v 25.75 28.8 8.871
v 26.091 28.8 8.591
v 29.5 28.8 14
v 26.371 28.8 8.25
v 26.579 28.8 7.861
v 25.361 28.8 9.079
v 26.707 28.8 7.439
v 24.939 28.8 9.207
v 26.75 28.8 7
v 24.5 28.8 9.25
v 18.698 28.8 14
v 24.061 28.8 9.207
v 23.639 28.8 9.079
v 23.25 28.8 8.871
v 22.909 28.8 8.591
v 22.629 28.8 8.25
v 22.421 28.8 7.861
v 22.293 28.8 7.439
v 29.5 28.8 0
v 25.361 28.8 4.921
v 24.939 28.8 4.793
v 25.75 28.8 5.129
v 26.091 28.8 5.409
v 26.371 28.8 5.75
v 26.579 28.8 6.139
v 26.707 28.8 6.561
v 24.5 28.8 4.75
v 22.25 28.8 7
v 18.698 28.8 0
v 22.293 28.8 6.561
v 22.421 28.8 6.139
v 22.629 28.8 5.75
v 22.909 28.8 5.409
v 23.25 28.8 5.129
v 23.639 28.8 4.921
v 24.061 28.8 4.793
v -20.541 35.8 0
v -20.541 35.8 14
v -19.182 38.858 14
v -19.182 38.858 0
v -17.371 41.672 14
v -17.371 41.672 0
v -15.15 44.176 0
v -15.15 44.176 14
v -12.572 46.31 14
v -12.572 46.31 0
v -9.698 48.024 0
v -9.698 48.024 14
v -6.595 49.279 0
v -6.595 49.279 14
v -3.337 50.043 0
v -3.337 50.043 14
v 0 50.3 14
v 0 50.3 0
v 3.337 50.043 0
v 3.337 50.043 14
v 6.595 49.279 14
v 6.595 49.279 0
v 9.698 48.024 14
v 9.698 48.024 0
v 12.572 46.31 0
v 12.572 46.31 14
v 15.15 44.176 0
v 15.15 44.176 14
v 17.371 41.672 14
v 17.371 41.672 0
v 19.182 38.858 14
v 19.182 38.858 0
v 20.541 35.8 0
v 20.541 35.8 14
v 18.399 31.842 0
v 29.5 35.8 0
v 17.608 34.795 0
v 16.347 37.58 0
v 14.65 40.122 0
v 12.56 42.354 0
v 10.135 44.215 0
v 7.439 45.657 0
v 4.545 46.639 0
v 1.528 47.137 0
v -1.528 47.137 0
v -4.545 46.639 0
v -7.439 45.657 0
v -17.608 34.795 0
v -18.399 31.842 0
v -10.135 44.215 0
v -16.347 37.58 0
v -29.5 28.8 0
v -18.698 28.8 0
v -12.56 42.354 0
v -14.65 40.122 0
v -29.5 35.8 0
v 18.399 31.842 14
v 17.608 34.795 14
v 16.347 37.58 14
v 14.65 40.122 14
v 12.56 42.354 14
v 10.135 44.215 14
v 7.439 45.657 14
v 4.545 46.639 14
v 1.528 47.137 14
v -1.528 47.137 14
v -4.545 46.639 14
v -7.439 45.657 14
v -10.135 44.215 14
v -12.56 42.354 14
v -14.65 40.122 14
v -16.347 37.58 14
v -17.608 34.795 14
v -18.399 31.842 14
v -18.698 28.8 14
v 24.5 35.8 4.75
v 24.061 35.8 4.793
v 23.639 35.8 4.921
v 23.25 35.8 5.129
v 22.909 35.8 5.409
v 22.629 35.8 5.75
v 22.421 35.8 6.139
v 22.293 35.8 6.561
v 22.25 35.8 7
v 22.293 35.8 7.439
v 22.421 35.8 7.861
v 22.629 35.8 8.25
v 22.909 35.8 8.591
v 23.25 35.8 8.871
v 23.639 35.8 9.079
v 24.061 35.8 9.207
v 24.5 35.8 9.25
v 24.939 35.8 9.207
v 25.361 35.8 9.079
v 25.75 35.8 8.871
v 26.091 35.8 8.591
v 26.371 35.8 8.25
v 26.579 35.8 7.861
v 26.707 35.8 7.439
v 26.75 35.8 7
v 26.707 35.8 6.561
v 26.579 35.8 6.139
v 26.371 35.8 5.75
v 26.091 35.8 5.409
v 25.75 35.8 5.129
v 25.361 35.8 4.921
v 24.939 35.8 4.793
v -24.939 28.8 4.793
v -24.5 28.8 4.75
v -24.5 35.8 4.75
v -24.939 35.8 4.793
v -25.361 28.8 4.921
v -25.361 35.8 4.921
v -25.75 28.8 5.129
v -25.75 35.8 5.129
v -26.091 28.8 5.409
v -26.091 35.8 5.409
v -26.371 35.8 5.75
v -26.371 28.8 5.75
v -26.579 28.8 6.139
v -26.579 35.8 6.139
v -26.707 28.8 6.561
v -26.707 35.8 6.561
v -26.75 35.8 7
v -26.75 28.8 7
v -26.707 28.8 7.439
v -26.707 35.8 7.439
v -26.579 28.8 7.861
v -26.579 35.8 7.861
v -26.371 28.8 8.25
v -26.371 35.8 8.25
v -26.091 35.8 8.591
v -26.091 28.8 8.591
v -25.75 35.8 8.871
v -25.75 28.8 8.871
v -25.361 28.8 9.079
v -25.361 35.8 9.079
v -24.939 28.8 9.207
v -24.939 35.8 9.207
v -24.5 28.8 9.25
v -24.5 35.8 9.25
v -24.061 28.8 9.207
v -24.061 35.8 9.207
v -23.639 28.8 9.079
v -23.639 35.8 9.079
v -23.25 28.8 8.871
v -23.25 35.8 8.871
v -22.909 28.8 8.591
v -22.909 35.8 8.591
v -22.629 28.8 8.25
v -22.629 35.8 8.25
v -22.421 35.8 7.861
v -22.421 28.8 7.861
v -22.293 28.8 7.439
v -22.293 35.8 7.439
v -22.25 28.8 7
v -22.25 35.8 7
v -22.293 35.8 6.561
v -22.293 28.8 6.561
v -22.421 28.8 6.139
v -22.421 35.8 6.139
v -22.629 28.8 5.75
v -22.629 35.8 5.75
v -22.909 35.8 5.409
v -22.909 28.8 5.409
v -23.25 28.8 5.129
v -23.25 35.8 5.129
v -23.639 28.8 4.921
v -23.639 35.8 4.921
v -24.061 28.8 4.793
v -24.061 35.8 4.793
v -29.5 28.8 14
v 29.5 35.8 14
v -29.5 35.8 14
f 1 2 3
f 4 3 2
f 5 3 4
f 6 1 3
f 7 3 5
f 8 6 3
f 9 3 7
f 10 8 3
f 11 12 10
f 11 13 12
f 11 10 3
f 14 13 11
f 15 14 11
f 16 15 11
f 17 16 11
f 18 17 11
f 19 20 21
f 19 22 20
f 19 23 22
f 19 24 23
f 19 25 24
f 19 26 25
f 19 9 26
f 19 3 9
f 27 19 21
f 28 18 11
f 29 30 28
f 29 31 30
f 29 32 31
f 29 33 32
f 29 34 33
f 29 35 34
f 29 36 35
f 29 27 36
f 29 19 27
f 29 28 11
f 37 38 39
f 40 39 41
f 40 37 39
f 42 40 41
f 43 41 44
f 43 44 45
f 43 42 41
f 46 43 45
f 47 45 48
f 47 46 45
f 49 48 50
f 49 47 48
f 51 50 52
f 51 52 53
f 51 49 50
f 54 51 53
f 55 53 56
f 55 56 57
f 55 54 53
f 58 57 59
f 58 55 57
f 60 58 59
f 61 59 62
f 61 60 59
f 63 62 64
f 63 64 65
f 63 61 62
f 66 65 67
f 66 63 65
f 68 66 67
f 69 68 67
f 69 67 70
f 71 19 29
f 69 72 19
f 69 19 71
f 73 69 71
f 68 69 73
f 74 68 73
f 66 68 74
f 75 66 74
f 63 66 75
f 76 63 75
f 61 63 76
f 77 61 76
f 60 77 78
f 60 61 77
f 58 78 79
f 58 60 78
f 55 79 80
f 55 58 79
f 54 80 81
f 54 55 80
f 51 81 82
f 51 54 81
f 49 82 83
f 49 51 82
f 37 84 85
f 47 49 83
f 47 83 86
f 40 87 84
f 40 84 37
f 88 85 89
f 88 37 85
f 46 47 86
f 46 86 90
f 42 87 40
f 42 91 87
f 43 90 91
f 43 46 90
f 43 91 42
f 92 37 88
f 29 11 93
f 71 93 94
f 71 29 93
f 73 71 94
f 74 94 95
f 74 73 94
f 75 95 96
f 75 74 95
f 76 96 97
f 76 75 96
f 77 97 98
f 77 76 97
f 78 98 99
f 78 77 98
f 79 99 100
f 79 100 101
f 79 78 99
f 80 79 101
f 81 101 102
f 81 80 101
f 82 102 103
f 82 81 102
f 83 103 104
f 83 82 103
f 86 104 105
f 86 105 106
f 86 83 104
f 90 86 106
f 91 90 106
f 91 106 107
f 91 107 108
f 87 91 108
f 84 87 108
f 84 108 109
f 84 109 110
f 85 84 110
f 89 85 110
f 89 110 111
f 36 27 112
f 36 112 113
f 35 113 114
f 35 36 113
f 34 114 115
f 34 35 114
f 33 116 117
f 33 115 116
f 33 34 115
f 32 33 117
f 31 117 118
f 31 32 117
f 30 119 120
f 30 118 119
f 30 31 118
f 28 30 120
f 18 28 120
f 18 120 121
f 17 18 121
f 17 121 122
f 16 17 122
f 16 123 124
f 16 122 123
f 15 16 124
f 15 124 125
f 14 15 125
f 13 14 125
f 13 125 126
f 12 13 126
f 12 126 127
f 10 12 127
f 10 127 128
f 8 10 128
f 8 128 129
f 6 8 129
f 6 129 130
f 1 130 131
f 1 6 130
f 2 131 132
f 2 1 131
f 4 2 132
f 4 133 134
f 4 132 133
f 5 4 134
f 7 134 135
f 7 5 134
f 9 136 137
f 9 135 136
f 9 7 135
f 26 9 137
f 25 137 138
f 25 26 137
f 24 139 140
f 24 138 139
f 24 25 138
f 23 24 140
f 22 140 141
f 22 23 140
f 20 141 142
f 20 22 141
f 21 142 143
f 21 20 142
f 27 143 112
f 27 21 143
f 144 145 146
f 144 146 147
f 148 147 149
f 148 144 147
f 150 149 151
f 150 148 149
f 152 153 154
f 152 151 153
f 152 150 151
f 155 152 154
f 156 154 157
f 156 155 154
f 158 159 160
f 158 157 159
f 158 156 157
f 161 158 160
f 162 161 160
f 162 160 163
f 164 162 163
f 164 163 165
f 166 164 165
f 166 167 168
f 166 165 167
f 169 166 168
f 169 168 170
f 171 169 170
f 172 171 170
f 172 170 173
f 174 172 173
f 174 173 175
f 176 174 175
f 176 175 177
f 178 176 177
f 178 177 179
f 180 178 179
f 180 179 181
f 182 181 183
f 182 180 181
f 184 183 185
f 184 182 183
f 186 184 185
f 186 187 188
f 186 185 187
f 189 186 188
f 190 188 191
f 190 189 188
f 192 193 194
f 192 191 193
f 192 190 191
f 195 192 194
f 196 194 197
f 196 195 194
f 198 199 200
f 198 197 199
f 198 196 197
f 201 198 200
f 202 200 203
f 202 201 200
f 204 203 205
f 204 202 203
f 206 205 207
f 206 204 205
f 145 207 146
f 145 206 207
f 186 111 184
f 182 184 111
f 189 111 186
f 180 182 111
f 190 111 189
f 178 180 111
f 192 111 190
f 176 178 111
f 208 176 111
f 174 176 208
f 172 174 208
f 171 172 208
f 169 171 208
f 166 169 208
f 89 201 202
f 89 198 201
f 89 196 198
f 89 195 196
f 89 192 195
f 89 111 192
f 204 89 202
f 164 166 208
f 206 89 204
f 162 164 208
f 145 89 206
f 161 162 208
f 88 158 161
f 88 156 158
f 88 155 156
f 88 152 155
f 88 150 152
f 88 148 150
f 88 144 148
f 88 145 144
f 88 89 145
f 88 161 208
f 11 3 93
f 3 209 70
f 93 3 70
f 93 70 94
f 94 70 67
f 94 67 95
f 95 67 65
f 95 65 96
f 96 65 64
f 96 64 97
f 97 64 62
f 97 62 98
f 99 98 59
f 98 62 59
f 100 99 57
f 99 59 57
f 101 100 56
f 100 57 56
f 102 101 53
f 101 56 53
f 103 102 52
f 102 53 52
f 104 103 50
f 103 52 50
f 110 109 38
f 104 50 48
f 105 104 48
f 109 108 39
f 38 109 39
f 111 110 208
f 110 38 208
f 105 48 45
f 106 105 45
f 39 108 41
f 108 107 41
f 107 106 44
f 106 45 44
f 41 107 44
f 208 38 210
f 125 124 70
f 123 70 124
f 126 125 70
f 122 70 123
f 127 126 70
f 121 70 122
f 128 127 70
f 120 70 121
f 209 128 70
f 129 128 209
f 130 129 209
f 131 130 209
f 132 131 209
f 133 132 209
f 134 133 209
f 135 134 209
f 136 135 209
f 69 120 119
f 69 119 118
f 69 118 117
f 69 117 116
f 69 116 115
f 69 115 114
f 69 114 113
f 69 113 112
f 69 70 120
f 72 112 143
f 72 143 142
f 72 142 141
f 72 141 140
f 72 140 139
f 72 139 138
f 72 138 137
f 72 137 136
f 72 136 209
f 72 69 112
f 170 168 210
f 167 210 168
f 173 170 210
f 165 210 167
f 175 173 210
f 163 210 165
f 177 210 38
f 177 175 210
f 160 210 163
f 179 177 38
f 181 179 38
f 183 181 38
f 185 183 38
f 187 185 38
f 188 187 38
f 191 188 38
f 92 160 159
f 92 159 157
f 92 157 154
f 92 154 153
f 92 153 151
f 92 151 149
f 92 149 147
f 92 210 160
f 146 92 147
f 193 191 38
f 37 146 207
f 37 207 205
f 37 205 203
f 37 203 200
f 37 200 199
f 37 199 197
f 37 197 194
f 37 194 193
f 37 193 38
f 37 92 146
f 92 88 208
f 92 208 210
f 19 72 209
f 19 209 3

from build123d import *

# Parameters (mm, degrees)
BOLTED_CAP_AND_EARS_DEPTH   = 14
M4_THROUGH_HOLES_DEPTH      = 60.969492244
M4_THROUGH_HOLES_DEPTH_BACK = 60.969492244
SKETCH2_R                   = 2.25


with BuildPart() as part:
    # Bolted cap and ears profile → Bolted cap and ears (new body)
    with BuildSketch(Plane.XY):
        with BuildLine():
            Line((20.541421567, 35.8), (29.5, 35.8))
            Line((29.5, 35.8), (29.5, 28.8))
            Line((29.5, 28.8), (18.697593428, 28.8))
            ThreePointArc((18.697593428, 28.8), (0, 47.2), (-18.697593428, 28.8))
            Line((-18.697593428, 28.8), (-29.5, 28.8))
            Line((-29.5, 28.8), (-29.5, 35.8))
            Line((-29.5, 35.8), (-20.541421567, 35.8))
            ThreePointArc((-20.541421567, 35.8), (0, 50.3), (20.541421567, 35.8))
        make_face()
    extrude(amount=BOLTED_CAP_AND_EARS_DEPTH)

    # Sketch2 → M4 through holes (cut, two sides: drawn at the far end of the back side and taken through both)
    with BuildSketch(Plane(origin=(0, 0, 0), x_dir=(1, 0, 0), z_dir=(0, 1, 0)).offset(-M4_THROUGH_HOLES_DEPTH_BACK)):
        with Locations(Location((-24.5, -7, 0), (0, 0, 90))):
            Circle(SKETCH2_R)
        with Locations(Location((24.5, -7, 0), (0, 0, 90))):
            Circle(SKETCH2_R)
    extrude(amount=M4_THROUGH_HOLES_DEPTH + M4_THROUGH_HOLES_DEPTH_BACK, mode=Mode.SUBTRACT)


solid = part.part
